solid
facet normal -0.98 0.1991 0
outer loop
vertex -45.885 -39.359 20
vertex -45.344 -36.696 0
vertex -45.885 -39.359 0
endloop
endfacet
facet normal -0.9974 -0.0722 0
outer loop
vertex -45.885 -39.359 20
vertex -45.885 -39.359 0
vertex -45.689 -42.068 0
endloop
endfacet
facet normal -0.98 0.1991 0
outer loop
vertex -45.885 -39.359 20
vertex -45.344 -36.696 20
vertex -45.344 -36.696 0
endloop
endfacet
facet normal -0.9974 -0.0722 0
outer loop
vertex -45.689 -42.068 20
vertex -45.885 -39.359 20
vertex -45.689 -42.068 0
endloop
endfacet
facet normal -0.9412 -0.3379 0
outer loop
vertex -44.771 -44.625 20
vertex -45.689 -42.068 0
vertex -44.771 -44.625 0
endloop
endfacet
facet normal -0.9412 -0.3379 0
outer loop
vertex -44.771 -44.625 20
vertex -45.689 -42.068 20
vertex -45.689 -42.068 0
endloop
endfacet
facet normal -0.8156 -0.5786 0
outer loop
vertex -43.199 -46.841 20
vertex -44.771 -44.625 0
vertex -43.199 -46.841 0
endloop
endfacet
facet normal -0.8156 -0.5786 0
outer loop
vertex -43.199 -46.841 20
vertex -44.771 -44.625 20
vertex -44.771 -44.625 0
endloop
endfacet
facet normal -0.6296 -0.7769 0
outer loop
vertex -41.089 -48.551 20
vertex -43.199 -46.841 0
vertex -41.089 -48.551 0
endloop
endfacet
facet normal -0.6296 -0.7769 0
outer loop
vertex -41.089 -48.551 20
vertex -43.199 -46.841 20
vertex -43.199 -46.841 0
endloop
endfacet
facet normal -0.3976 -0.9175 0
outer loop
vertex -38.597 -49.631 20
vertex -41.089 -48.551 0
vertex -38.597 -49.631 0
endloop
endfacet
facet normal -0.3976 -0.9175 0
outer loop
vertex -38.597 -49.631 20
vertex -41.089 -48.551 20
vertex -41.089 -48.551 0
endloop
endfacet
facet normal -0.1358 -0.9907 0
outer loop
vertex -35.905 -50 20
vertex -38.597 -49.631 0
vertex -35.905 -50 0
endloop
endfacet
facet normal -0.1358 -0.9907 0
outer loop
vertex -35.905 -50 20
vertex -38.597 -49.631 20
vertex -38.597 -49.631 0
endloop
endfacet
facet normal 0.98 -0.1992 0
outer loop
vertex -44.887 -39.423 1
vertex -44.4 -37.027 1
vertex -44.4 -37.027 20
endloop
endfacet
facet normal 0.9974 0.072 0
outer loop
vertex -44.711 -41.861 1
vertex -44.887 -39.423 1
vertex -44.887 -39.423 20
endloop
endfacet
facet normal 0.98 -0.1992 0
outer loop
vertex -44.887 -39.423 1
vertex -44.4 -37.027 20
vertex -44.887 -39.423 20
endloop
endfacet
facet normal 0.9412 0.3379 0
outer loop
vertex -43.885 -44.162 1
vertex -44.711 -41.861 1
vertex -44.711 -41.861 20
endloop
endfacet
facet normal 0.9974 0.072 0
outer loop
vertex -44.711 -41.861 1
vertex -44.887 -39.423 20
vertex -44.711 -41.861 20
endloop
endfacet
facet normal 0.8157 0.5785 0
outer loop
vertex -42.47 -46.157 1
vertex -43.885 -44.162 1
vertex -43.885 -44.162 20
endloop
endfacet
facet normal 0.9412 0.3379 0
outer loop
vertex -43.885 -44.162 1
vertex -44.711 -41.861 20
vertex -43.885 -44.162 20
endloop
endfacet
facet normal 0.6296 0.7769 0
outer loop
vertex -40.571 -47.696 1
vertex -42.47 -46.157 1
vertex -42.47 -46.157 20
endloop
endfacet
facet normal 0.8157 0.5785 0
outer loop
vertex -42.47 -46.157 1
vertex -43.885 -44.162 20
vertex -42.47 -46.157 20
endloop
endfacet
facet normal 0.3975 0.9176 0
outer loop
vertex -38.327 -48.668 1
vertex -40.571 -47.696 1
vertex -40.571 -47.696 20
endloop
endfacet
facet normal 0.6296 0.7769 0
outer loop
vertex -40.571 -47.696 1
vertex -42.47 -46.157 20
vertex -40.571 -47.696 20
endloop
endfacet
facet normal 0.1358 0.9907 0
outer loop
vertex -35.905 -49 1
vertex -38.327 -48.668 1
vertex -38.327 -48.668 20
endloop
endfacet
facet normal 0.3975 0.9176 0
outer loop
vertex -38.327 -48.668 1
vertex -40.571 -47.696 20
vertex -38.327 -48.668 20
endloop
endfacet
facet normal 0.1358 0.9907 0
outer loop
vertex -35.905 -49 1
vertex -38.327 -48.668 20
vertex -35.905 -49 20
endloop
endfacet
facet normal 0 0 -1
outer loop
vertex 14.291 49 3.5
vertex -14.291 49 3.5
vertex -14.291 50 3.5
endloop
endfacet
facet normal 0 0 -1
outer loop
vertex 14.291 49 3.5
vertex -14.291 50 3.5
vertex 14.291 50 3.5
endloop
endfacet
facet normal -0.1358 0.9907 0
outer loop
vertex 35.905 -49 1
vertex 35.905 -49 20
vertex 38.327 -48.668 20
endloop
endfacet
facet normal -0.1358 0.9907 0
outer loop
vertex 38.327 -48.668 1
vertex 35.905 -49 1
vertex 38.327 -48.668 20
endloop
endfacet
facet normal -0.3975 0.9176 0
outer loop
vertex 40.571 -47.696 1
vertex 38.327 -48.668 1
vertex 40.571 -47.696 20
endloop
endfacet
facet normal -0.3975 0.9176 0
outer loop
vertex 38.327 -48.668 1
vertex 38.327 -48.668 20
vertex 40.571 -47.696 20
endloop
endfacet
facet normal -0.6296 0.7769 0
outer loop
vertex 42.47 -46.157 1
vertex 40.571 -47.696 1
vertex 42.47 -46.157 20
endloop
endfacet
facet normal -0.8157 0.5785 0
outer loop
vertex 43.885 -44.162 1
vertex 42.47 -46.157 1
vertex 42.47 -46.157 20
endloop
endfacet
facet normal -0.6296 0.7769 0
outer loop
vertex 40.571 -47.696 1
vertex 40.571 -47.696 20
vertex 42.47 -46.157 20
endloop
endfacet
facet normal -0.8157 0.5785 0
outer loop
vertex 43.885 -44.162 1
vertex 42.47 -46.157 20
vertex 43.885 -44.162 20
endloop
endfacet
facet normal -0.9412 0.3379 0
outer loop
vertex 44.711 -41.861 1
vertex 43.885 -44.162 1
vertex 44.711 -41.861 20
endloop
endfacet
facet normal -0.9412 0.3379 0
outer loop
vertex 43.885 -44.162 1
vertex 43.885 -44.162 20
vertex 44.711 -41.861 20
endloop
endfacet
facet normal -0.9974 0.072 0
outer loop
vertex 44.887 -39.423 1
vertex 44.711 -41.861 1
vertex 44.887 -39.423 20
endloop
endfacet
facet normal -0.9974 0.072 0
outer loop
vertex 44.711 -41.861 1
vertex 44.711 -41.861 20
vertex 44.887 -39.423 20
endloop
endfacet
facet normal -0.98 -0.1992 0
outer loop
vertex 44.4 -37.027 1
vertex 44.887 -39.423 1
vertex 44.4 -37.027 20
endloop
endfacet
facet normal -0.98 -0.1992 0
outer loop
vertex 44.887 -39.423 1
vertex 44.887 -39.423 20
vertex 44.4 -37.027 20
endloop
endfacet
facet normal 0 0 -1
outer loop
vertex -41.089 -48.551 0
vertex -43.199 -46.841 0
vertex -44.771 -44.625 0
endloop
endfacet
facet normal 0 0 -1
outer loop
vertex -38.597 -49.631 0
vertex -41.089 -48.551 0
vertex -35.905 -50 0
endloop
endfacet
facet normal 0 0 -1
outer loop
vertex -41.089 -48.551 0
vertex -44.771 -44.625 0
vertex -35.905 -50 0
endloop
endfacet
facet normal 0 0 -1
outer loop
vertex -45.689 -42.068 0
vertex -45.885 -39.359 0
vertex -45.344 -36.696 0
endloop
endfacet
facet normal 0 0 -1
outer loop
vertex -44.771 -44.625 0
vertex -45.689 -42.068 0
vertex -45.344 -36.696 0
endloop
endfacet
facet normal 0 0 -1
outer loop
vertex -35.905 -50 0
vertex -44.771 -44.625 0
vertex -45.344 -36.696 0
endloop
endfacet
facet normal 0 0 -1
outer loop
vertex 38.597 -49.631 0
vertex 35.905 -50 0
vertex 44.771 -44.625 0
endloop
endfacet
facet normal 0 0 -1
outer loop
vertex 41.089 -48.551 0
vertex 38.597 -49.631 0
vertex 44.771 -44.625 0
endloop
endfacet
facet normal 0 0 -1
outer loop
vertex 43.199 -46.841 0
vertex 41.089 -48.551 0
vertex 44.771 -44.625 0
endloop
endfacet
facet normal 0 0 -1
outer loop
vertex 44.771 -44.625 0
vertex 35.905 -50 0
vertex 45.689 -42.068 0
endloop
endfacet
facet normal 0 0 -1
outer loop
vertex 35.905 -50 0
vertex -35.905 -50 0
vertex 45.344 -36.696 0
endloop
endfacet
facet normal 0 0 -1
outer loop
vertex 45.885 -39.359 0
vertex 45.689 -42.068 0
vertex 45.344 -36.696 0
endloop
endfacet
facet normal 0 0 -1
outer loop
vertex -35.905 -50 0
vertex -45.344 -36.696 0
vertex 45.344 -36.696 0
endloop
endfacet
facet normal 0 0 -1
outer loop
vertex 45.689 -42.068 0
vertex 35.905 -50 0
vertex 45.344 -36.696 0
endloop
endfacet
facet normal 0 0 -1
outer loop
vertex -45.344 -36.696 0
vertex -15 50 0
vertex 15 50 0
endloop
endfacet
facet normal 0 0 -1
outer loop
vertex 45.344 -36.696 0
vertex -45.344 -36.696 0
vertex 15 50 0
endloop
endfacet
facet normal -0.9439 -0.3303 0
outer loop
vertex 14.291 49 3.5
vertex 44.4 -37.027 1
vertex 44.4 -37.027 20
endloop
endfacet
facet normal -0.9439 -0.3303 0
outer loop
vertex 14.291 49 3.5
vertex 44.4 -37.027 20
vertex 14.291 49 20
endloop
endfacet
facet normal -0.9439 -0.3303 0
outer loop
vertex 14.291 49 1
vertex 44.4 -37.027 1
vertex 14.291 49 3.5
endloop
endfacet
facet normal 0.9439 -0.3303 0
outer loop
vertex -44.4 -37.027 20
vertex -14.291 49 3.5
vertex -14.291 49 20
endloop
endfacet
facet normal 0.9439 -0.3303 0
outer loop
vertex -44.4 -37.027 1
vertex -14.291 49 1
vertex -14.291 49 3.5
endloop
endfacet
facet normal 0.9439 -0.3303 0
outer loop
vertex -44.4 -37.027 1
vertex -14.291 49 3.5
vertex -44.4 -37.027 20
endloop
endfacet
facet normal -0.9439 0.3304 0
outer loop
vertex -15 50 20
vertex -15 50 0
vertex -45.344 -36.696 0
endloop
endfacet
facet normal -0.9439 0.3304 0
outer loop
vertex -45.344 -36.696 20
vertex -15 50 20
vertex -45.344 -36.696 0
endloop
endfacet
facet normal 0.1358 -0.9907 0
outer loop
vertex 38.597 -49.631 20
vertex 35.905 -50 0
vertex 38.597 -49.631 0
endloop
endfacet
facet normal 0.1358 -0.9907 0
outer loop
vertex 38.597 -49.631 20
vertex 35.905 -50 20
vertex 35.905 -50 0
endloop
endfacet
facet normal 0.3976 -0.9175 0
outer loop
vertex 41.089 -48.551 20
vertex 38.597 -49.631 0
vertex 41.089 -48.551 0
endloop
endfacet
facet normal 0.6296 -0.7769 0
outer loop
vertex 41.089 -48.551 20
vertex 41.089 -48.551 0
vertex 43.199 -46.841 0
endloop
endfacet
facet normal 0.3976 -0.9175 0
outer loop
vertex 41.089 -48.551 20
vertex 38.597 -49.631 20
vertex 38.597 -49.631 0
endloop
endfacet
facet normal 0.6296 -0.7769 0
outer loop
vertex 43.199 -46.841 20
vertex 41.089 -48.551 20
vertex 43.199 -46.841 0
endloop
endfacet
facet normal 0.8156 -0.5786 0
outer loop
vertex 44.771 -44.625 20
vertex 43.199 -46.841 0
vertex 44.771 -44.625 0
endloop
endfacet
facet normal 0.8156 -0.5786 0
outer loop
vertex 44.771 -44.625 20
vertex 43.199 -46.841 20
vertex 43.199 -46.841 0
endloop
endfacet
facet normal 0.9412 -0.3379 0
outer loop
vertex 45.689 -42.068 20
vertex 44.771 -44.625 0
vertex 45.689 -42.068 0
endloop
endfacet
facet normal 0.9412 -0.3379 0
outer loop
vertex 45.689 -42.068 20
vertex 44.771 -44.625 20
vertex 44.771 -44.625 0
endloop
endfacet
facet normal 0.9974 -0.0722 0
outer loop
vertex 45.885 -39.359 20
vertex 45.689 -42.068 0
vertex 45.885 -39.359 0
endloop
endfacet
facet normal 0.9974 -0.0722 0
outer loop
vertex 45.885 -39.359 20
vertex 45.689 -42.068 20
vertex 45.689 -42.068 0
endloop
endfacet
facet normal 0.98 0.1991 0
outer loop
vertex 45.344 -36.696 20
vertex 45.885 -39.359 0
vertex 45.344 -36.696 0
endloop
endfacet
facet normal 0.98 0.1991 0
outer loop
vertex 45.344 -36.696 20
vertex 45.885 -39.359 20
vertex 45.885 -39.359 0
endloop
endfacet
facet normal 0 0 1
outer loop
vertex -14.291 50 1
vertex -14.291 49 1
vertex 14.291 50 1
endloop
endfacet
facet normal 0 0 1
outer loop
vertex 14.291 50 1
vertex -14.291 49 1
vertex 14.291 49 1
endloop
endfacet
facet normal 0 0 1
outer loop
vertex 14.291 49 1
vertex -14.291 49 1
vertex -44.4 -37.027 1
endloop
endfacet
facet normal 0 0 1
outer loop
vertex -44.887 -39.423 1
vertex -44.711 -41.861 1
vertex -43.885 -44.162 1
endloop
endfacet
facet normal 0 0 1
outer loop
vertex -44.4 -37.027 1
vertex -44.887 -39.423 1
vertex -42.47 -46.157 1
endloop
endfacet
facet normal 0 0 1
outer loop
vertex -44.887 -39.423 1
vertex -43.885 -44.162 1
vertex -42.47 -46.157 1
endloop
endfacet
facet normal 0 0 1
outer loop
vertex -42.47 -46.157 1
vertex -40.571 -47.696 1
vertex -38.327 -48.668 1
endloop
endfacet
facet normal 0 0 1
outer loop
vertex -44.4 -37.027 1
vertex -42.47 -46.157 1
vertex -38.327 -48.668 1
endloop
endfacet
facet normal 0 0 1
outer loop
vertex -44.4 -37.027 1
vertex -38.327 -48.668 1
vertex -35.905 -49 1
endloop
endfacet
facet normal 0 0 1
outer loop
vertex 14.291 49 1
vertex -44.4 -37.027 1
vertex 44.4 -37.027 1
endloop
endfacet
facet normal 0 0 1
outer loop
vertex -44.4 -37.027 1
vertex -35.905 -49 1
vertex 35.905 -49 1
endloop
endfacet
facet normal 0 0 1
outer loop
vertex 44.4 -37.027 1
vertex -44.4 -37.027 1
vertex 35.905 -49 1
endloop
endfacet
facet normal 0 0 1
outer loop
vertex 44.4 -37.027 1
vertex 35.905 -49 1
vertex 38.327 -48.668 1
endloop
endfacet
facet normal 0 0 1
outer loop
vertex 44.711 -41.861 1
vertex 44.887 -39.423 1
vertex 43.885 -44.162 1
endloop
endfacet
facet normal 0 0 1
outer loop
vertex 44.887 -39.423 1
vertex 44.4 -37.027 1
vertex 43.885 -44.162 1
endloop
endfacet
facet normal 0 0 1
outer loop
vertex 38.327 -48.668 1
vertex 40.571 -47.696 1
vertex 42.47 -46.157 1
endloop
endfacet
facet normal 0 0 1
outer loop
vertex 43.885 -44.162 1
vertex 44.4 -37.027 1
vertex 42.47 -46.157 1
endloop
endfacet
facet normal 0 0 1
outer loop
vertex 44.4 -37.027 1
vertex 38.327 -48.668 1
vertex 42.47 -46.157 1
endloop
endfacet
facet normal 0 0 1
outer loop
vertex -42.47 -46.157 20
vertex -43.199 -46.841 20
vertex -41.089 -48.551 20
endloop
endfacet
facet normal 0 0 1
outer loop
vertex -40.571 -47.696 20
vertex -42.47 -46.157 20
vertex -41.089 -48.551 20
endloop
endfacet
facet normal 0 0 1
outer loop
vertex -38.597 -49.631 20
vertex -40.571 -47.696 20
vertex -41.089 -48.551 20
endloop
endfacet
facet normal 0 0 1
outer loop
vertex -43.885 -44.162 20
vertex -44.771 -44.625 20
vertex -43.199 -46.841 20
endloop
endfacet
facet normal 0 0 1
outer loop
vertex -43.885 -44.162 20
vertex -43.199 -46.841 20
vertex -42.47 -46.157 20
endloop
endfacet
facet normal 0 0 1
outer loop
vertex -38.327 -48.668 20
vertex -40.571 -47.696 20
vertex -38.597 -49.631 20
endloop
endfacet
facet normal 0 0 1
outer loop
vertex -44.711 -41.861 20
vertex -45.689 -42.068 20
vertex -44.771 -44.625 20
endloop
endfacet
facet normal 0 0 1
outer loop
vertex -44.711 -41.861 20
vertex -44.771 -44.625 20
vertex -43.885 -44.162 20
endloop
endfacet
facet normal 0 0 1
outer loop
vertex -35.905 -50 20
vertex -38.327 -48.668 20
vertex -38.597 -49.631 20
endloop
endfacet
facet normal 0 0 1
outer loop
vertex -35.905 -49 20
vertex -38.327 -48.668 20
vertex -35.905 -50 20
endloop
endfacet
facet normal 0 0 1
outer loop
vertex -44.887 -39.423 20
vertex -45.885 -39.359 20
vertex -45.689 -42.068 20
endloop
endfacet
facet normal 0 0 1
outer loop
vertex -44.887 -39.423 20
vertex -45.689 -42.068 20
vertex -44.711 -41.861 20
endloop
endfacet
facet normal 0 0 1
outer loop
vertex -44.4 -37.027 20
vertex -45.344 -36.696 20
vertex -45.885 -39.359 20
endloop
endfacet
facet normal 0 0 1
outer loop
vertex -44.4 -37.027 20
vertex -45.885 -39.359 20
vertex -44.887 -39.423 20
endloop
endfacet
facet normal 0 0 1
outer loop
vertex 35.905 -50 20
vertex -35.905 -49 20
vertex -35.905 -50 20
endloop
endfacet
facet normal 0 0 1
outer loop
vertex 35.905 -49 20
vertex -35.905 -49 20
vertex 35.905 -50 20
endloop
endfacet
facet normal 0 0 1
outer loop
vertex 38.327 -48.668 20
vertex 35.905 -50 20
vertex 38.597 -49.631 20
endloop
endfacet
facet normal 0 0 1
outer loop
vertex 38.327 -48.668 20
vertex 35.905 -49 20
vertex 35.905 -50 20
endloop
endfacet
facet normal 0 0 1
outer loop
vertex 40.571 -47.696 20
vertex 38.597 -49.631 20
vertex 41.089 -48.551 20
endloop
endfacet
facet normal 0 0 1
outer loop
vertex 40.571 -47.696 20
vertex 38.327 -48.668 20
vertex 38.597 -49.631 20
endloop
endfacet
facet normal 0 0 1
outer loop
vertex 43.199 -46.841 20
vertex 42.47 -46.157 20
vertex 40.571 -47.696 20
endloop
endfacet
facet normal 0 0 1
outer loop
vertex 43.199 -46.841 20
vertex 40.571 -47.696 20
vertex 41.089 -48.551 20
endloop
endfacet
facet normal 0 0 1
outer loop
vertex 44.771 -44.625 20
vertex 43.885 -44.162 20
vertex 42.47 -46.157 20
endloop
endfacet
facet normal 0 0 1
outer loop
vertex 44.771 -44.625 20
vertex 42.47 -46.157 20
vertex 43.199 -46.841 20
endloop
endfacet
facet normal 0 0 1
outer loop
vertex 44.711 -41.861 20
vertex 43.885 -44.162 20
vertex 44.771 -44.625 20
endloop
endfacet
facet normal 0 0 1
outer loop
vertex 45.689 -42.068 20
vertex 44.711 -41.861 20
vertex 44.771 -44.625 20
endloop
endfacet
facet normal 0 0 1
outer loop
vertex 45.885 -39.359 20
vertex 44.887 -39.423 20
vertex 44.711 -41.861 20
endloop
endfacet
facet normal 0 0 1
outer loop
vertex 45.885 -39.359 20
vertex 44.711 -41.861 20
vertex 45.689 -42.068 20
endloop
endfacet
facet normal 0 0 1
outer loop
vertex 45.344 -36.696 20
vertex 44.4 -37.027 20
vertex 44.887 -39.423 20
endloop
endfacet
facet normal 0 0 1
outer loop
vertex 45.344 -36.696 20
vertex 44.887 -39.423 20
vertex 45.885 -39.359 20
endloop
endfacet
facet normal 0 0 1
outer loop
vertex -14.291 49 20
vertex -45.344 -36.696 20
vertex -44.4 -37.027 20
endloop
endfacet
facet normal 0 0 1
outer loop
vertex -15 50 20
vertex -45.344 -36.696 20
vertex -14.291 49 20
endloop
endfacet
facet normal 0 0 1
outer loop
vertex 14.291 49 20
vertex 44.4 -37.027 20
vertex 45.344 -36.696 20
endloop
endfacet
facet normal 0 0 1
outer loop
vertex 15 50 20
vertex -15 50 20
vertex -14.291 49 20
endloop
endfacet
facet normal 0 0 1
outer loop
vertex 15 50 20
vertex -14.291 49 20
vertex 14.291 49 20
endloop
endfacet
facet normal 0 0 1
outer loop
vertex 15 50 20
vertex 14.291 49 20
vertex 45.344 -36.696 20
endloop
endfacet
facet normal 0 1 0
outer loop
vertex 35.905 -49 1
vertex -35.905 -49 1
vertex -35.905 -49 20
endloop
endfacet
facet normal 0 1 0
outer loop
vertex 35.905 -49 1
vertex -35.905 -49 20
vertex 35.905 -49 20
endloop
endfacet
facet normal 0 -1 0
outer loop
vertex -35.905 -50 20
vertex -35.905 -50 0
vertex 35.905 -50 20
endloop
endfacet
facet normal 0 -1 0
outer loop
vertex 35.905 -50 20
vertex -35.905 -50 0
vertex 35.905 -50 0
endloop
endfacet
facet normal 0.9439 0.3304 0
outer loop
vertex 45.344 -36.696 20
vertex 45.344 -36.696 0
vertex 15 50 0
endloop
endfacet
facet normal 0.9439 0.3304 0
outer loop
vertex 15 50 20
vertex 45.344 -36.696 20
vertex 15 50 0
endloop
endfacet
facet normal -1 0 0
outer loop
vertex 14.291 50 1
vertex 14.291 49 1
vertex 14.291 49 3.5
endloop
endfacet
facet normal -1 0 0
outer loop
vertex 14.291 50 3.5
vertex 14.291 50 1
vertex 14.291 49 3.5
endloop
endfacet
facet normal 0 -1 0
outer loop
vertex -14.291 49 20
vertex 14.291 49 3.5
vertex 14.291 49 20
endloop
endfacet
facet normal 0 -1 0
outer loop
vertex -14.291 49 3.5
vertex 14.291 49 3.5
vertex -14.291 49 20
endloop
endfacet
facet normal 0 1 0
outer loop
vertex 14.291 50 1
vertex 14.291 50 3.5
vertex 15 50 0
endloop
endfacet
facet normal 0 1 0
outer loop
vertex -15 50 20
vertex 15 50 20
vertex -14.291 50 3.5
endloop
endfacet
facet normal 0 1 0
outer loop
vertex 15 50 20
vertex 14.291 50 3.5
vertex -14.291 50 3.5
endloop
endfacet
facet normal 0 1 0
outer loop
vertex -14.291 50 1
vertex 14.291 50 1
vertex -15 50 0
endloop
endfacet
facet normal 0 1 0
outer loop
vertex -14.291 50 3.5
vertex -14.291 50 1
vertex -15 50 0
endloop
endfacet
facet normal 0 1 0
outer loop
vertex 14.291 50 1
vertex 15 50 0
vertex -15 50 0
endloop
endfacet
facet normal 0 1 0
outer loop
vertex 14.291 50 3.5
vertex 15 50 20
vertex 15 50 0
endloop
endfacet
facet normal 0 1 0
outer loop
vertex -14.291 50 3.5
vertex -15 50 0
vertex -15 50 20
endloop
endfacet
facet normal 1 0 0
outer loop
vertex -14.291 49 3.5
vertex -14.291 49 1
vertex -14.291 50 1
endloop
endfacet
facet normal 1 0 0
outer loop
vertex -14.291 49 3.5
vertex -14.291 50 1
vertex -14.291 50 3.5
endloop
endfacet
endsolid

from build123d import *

# Parameters (mm, degrees)
F1_DEPTH = 20
F2_R     = 10
F3_T     = -1
F4_W     = 28.581038
F4_H     = 2.5
F5_DEPTH = 1


with BuildPart() as f1:
    # F0 (on Top) → F1 (new body)
    with BuildSketch(Plane.XY):
        Polygon((-15, 50), (-50, -50), (50, -50), (15, 50), align=None)
    extrude(amount=F1_DEPTH)

    # F2
    f2_edges = [f1.edges().sort_by_distance(p)[0] for p in [
        (-50, -50, 10),
        (50, -50, 10),
    ]]
    fillet(f2_edges, radius=F2_R)

    # F3
    f3_openings = [f1.faces().sort_by_distance(p)[0] for p in [
        (0, -8.435574, 20),
    ]]
    offset(amount=F3_T, openings=f3_openings)

    # F4 (on face) → F5 (cut, through all)
    with BuildSketch(Plane.XZ.offset(-49)):
        with Locations((0, 2.25)):
            Rectangle(F4_W, F4_H)
    extrude(amount=-F5_DEPTH, mode=Mode.SUBTRACT)


solid = f1.part
